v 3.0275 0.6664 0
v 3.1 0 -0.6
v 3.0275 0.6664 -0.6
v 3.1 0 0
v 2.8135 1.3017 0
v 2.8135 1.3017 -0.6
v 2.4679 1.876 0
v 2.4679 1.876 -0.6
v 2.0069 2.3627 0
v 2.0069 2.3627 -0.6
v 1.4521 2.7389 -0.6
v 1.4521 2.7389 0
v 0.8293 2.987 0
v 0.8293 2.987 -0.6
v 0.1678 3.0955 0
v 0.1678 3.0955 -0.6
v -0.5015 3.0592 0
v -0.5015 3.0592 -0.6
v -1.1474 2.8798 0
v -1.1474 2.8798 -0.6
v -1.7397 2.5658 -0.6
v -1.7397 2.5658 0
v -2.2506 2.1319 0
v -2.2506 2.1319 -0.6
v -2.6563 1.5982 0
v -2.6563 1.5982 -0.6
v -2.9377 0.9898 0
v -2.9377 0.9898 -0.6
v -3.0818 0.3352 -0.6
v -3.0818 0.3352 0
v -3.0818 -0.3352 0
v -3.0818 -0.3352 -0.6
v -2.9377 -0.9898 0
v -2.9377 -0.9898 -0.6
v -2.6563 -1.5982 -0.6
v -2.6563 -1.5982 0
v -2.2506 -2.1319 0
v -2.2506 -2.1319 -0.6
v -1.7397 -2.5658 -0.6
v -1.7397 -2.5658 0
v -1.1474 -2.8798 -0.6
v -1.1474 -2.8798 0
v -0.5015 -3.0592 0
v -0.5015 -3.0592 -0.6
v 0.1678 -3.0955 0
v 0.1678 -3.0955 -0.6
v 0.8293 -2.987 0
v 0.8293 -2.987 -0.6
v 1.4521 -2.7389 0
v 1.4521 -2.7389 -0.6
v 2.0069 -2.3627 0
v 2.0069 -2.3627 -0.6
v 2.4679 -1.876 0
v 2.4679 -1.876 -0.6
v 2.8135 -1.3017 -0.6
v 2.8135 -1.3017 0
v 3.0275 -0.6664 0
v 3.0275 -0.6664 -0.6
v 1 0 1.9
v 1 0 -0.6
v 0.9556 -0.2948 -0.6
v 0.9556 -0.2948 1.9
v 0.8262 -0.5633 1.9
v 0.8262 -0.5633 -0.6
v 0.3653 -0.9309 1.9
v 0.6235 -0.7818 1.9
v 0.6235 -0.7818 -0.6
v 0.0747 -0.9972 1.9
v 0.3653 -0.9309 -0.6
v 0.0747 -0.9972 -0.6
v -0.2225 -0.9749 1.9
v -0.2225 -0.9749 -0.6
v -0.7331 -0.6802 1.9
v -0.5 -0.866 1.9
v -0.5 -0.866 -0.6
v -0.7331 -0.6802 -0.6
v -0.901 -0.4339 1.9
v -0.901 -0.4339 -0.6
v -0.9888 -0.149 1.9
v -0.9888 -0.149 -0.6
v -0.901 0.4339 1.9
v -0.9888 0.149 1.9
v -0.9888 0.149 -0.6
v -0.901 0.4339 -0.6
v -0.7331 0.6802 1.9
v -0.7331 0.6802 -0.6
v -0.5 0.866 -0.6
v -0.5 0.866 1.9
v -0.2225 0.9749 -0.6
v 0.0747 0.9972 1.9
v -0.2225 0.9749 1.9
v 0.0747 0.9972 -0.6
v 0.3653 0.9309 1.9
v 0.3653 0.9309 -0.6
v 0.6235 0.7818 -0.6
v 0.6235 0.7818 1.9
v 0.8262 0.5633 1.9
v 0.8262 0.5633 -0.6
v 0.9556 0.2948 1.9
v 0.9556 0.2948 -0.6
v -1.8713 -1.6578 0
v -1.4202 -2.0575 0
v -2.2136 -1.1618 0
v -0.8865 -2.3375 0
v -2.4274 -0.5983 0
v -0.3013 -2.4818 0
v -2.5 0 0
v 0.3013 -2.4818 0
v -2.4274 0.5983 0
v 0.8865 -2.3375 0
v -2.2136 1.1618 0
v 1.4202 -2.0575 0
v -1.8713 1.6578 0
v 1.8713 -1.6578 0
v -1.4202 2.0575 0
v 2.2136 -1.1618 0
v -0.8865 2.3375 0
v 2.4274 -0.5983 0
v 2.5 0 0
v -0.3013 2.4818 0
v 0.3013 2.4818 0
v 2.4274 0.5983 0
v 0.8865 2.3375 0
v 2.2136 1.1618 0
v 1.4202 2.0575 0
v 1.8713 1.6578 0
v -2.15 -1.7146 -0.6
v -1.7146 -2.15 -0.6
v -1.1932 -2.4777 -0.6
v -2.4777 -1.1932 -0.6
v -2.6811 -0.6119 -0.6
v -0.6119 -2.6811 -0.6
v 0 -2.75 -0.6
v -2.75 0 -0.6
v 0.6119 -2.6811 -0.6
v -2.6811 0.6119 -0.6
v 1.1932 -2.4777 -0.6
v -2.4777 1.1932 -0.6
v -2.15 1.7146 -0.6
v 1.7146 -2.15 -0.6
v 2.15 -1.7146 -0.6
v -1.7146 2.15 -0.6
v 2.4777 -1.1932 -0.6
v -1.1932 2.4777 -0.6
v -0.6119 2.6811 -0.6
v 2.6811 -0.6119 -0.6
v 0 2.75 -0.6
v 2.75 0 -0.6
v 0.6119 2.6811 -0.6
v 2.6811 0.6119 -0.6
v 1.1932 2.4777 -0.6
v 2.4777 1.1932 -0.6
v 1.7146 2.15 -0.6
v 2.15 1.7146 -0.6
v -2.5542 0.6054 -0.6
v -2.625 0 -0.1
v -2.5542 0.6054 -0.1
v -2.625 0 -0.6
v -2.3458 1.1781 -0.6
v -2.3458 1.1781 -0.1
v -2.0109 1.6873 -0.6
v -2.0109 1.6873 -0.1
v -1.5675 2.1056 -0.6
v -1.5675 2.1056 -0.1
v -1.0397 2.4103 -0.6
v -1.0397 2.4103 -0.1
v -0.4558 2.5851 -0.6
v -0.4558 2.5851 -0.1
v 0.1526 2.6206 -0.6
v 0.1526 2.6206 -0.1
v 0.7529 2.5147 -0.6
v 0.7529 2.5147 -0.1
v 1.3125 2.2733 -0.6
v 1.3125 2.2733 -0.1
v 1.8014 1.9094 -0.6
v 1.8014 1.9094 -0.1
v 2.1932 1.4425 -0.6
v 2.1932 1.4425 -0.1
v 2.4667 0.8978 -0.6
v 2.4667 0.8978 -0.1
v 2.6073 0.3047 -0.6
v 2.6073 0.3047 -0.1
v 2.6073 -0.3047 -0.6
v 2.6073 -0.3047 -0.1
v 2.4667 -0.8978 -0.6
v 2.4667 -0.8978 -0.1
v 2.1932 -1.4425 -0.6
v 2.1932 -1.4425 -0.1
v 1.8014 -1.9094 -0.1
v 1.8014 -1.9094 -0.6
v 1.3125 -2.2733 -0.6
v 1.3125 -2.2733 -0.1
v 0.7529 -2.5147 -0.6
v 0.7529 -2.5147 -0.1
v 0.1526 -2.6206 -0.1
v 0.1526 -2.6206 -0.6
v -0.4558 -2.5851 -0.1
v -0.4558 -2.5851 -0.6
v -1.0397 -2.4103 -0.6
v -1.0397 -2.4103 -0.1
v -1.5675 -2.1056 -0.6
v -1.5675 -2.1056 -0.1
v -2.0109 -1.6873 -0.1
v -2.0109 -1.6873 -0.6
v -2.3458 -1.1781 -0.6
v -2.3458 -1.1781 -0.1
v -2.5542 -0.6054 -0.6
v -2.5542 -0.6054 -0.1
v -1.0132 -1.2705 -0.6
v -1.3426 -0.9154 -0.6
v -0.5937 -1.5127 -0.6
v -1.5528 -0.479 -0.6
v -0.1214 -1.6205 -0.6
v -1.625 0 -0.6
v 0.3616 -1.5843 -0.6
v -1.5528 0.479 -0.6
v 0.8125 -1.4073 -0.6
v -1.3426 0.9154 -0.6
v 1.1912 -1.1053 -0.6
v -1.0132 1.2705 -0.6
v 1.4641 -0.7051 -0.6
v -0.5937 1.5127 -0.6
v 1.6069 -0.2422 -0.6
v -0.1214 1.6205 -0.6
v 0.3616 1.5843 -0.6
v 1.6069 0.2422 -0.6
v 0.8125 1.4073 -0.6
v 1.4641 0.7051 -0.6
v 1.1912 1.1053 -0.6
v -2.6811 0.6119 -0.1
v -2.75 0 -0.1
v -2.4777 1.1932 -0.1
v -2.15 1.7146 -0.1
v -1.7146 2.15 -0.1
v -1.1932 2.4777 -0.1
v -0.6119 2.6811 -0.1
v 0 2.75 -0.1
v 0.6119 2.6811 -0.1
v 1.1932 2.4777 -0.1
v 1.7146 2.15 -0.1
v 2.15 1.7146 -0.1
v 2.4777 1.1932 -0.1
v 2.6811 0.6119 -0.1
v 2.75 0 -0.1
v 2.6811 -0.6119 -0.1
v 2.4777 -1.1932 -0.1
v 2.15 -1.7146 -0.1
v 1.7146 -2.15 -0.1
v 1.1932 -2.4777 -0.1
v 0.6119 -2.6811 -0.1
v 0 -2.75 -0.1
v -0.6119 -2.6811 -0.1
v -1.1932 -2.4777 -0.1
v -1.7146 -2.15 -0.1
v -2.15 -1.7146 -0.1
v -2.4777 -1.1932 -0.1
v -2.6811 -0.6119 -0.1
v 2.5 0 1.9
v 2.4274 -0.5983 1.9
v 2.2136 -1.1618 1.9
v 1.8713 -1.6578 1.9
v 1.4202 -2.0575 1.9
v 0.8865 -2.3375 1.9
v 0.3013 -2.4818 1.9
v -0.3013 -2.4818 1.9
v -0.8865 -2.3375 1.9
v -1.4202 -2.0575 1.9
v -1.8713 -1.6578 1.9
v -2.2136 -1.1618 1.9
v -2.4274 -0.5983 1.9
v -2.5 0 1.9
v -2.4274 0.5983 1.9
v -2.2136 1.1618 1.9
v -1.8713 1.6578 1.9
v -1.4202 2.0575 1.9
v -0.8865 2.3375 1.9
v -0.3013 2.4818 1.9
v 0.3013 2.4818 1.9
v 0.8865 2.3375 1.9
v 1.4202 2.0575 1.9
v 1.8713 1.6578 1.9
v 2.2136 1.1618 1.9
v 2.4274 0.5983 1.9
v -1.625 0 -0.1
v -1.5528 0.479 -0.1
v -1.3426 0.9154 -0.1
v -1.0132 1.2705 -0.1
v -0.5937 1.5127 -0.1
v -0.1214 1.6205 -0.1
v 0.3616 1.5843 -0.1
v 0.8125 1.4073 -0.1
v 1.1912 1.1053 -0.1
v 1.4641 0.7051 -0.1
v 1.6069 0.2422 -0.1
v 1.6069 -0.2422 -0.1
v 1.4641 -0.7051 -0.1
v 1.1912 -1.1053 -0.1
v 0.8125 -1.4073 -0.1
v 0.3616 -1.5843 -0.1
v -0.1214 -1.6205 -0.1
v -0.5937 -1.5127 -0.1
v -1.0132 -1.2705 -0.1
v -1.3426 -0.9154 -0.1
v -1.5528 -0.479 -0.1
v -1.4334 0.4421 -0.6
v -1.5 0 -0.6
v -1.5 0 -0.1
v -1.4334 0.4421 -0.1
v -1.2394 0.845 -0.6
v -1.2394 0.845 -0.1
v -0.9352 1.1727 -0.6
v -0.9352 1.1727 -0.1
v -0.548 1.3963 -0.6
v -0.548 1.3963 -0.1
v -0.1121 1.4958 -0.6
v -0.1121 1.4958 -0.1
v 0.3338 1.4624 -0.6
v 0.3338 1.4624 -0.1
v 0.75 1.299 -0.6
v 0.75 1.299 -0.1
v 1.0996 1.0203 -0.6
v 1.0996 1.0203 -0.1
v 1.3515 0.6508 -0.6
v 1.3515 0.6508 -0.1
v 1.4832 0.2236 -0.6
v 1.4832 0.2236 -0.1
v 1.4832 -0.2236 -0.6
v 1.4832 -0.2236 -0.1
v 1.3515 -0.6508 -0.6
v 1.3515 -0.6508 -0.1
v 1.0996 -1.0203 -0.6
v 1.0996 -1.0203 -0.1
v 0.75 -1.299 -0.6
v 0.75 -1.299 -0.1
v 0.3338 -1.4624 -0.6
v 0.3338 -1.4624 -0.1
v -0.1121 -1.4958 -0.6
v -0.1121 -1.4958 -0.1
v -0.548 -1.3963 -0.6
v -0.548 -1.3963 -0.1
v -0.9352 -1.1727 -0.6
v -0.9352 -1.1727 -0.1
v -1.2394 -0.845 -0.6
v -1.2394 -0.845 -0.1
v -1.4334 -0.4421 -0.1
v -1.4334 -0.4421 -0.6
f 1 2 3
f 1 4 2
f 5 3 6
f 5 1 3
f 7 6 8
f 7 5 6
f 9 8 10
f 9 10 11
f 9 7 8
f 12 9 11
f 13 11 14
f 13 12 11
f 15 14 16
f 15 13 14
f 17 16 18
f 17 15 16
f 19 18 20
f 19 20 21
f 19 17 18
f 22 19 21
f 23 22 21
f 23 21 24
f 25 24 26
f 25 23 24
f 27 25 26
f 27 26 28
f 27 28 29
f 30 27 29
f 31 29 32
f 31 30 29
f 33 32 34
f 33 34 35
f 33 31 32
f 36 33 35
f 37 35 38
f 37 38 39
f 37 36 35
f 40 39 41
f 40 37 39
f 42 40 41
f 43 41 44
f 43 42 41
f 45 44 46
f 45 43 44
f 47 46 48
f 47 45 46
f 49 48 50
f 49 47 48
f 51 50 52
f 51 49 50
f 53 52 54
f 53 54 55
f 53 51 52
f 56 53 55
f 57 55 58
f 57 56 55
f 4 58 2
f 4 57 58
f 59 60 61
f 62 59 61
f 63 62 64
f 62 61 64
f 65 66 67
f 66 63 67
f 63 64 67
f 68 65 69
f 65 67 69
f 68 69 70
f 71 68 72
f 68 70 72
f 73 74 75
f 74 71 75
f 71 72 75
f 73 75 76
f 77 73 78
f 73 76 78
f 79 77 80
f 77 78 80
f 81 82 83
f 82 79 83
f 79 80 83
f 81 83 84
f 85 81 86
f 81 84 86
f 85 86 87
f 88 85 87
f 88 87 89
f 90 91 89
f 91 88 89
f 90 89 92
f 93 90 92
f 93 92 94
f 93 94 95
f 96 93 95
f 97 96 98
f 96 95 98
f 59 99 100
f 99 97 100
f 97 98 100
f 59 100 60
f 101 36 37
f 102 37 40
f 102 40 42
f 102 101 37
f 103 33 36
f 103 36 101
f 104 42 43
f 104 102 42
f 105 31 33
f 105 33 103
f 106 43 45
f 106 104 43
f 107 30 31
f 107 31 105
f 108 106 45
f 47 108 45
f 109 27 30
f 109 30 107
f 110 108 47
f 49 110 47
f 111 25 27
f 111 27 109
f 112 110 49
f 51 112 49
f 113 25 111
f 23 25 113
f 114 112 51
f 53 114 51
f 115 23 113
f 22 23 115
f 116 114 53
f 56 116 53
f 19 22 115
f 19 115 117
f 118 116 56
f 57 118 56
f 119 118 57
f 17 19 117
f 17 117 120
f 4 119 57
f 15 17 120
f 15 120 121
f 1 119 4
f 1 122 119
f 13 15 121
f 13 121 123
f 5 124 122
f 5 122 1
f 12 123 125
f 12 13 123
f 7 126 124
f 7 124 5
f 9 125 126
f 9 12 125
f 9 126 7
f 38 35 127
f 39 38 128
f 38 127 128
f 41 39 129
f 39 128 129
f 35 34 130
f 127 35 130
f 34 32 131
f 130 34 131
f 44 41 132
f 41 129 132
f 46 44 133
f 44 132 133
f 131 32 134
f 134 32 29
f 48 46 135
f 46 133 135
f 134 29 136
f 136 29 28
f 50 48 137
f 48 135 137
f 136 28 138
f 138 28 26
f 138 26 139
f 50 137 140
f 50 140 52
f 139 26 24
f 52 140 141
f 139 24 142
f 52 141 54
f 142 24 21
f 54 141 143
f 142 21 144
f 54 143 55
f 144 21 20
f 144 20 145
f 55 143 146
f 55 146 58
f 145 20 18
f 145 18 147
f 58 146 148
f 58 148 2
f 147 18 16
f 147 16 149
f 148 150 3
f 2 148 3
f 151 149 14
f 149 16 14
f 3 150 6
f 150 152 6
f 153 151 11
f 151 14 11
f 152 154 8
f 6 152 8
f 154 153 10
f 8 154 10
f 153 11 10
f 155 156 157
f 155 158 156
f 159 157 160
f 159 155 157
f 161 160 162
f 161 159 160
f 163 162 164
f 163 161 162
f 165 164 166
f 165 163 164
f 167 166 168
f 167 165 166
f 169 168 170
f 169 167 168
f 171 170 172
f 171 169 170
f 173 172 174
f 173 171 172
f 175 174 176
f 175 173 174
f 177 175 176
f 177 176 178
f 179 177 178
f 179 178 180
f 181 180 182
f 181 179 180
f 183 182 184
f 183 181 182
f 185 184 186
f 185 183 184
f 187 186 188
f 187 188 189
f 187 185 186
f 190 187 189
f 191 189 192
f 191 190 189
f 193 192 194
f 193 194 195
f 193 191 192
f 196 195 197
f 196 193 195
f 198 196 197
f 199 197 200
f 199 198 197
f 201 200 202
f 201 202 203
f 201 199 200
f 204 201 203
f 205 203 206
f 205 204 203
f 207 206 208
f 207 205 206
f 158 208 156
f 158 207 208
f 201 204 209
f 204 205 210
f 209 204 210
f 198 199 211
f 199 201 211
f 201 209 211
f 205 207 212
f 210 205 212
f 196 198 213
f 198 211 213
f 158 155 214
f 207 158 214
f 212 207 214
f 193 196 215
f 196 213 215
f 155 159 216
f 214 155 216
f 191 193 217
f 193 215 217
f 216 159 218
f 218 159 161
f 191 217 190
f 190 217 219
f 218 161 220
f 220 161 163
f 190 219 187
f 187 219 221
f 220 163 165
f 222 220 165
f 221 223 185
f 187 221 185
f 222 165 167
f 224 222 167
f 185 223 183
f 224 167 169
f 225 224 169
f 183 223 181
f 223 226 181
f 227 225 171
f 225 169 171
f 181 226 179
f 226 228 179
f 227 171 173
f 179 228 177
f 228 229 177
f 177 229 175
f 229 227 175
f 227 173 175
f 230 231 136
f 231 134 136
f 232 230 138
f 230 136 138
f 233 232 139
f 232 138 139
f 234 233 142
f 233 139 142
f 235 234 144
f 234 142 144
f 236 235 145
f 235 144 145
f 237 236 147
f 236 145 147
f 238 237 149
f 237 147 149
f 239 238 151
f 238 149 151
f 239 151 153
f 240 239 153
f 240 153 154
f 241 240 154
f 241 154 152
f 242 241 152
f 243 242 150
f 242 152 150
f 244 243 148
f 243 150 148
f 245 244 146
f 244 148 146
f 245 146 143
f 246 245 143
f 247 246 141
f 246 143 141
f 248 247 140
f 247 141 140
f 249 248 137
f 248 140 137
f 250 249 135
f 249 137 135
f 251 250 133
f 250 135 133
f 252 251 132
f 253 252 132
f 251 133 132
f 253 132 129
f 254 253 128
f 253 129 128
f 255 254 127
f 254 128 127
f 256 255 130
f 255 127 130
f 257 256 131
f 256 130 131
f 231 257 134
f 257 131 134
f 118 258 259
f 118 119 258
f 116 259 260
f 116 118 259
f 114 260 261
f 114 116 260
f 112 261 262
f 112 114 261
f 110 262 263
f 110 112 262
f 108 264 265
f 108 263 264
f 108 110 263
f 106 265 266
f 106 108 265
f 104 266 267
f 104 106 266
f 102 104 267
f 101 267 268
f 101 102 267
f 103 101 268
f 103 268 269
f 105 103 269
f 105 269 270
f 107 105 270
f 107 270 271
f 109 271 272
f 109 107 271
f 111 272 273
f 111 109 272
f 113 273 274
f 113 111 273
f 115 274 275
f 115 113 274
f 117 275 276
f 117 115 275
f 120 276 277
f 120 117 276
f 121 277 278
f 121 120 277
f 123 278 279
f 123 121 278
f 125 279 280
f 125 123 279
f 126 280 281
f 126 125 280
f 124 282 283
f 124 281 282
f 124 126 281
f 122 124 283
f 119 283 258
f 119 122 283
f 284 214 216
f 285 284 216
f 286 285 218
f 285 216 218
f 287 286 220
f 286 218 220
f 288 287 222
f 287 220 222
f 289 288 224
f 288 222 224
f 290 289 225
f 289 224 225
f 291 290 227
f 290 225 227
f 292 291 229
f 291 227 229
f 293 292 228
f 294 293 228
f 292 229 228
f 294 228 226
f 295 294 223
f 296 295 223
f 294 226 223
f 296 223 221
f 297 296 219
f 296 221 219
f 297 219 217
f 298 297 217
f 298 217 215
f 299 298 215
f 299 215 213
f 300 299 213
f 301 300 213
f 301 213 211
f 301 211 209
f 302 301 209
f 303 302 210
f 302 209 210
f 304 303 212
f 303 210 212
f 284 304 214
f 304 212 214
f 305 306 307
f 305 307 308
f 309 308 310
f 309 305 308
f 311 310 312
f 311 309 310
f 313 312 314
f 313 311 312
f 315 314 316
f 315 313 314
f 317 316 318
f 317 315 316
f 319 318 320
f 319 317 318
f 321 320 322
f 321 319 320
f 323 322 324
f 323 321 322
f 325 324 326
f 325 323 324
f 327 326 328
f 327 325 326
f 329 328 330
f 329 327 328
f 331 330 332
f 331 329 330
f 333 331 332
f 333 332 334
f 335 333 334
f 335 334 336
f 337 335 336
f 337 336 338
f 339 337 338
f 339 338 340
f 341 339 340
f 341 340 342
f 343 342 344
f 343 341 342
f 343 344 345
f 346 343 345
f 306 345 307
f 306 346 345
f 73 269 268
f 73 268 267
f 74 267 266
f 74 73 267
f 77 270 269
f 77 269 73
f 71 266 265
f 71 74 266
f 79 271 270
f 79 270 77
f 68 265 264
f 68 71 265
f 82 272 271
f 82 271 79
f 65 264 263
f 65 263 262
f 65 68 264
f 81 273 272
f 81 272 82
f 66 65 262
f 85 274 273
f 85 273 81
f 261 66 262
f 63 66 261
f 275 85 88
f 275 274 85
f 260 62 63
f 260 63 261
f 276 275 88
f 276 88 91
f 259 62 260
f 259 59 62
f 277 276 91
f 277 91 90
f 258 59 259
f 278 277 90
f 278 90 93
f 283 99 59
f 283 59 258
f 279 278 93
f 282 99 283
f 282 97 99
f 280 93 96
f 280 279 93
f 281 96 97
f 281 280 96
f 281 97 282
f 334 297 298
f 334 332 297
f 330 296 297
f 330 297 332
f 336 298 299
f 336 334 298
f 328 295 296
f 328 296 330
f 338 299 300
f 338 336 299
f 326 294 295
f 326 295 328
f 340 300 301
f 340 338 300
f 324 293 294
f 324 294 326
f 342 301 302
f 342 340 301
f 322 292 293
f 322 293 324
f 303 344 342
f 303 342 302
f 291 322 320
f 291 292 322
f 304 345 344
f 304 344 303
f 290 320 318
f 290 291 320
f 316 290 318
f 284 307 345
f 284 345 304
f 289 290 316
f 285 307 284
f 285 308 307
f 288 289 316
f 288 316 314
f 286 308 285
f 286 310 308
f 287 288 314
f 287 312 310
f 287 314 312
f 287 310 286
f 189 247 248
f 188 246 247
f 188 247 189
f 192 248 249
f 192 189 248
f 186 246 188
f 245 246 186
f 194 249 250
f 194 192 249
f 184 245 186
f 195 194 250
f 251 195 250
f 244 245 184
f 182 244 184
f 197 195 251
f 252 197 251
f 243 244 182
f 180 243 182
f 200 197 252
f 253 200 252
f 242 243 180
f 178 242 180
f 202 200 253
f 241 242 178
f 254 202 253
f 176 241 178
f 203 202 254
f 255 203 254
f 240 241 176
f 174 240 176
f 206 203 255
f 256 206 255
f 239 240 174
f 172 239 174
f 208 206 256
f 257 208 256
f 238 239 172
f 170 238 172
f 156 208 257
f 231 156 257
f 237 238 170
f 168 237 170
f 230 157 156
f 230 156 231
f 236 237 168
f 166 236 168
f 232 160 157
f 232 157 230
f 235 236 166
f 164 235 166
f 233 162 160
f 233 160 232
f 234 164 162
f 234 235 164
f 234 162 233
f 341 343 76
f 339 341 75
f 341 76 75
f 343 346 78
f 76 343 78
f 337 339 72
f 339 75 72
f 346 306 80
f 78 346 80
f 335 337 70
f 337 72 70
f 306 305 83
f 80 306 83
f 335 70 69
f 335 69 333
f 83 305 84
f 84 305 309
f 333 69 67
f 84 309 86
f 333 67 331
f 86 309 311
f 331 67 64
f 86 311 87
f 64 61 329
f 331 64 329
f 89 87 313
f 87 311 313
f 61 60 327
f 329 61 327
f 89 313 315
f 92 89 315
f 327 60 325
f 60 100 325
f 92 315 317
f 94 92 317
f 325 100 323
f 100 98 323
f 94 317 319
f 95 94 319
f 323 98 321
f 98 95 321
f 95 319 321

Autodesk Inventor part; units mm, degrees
ref_plane "YZ Plane" through (0, 0, 0) normal (1, 0, 0) x (0, 1, 0)
ref_plane "XZ Plane" through (0, 0, 0) normal (0, 1, 0) x (-1, 0, 0)
ref_plane "XY Plane" through (0, 0, 0) normal (0, 0, 1) x (1, 0, 0)
sketch "スケッチ1" plane through (0, 0, 0) normal (0, 0, 1) x (1, 0, 0)
  circle A0 centre (0, 0) radius 3.1
  circle A1 centre (0, 0) radius 2.5
  circle A2 centre (0, 0) radius 1
  dimension "d0" = 6.2
  dimension "d1" = 5
  dimension "d2" = 2
extrude "押し出し1" add sketch "スケッチ1" against normal blind 0.6 contours A0 | A1
extrude "押し出し2" add sketch "スケッチ1" along normal blind 1.9 contours A1
sketch "スケッチ2" plane through (0, 0, -0.6) normal (0, 0, -1) x (-1, 0, 0)
  circle A0 centre (0, 0) radius 2.75
  circle A1 centre (0, 0) radius 1.5
  circle A2 centre (0, 0) radius 2.625
  circle A3 centre (0, 0) radius 1.625
  dimension "d7" = 5.5
  dimension "d8" = 3
  dimension "d11" = 5.25
  dimension "d12" = 3.25
extrude "押し出し4" cut sketch "スケッチ2" against normal blind 0.5 contours A3
extrude "押し出し5" cut sketch "スケッチ2" against normal blind 0.5 contours A0
properties part number "ベアリング"
